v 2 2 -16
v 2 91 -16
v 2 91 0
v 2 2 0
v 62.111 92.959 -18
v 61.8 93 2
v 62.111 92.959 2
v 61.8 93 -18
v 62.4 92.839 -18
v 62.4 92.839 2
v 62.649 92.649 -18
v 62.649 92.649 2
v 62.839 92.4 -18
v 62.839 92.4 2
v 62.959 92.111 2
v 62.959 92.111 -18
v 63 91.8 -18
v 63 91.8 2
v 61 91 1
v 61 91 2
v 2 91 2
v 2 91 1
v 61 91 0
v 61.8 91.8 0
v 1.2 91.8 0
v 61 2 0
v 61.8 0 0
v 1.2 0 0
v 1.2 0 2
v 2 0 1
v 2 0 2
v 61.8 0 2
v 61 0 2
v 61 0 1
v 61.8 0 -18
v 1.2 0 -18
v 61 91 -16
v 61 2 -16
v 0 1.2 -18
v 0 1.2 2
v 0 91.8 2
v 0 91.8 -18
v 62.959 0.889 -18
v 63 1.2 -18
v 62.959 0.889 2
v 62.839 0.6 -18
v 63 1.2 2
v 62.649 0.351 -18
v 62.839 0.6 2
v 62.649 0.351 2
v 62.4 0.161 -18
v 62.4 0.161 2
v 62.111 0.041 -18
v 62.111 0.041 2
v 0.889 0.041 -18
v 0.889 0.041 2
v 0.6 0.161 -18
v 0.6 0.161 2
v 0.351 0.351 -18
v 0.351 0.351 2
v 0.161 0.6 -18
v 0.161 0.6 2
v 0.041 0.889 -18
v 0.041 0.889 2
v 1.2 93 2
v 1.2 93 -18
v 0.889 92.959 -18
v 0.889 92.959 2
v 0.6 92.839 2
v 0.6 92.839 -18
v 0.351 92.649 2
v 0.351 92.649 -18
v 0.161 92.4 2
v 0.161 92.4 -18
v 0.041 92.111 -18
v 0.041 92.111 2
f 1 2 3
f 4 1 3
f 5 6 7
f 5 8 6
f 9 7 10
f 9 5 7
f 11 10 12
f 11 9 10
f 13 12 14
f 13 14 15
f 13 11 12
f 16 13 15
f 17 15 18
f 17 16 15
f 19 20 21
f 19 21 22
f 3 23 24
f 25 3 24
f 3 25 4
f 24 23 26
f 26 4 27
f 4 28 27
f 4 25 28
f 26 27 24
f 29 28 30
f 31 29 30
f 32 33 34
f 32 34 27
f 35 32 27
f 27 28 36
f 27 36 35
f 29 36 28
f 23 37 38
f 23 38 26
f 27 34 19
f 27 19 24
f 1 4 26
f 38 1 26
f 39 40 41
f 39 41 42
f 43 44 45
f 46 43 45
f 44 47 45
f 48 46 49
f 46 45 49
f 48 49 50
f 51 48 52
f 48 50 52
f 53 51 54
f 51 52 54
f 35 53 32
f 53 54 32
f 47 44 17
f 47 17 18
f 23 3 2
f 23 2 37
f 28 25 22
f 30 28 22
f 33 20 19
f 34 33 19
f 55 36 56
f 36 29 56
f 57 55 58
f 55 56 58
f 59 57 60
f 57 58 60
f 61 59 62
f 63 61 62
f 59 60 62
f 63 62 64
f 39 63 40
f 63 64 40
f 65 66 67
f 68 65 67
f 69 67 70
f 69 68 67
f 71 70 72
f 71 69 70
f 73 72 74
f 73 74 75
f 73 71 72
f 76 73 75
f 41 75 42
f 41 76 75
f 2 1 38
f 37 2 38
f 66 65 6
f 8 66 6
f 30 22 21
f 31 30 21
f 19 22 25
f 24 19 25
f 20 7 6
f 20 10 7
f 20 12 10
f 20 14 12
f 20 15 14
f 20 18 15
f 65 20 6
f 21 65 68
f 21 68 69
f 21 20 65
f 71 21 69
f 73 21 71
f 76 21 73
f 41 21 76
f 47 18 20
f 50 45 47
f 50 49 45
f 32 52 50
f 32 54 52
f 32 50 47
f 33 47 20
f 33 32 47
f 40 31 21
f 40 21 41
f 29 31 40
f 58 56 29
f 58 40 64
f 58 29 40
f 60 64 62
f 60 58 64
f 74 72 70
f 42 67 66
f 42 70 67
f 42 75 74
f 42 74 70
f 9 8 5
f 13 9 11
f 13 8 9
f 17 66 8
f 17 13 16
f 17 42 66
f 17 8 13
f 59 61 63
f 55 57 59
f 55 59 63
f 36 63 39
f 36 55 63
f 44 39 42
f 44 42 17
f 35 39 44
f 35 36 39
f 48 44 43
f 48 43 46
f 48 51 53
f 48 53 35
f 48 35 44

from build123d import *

# Parameters (mm, degrees)
F0_W     = 63
F0_H     = 18
F1_DEPTH = 93
F2_T     = -2
F4_DEPTH = 93
F6_DEPTH = 63
F7_R     = 1.19999


# Not quite as in the source:
# - a fillet or chamfer is up to 0.001 mm smaller than in the source, because OpenCascade refuses the exact size


with BuildPart() as f1:
    # F0 (on Front) → F1 (new body)
    with BuildSketch(Plane.XZ):
        with Locations((31.5, -9)):
            Rectangle(F0_W, F0_H)
    extrude(amount=-F1_DEPTH)

    # F2
    f2_openings = [f1.faces().sort_by_distance(p)[0] for p in [
        (31.5, 46.5, 0),
    ]]
    offset(amount=F2_T, openings=f2_openings)

    # F3 (on face) → F4 (join, through all)
    with BuildSketch(Plane.XZ):
        Polygon((0, 2), (0, 0), (1.2, 0), (2, 1), (2, 2), align=None)
        Polygon((61, 1), (61.8, 0), (63, 0), (63, 2), (61, 2), align=None)
    extrude(amount=-F4_DEPTH)

    # F5 (on face) → F6 (join, through all)
    with BuildSketch(Plane.YZ.offset(63)):
        Polygon((93, 0), (93, 2), (91, 2), (91, 1), (91.8, 0), align=None)
    extrude(amount=-F6_DEPTH)

    # F7 (radius 1.2 in the source; OpenCascade refuses exactly that, so slightly less here)
    f7_edges = [f1.edges().sort_by_distance(p)[0] for p in [
        (63, 0, -8),
        (63, 93, -8),
        (0, 0, -8),
        (0, 93, -8),
    ]]
    fillet(f7_edges, radius=F7_R)


solid = f1.part
